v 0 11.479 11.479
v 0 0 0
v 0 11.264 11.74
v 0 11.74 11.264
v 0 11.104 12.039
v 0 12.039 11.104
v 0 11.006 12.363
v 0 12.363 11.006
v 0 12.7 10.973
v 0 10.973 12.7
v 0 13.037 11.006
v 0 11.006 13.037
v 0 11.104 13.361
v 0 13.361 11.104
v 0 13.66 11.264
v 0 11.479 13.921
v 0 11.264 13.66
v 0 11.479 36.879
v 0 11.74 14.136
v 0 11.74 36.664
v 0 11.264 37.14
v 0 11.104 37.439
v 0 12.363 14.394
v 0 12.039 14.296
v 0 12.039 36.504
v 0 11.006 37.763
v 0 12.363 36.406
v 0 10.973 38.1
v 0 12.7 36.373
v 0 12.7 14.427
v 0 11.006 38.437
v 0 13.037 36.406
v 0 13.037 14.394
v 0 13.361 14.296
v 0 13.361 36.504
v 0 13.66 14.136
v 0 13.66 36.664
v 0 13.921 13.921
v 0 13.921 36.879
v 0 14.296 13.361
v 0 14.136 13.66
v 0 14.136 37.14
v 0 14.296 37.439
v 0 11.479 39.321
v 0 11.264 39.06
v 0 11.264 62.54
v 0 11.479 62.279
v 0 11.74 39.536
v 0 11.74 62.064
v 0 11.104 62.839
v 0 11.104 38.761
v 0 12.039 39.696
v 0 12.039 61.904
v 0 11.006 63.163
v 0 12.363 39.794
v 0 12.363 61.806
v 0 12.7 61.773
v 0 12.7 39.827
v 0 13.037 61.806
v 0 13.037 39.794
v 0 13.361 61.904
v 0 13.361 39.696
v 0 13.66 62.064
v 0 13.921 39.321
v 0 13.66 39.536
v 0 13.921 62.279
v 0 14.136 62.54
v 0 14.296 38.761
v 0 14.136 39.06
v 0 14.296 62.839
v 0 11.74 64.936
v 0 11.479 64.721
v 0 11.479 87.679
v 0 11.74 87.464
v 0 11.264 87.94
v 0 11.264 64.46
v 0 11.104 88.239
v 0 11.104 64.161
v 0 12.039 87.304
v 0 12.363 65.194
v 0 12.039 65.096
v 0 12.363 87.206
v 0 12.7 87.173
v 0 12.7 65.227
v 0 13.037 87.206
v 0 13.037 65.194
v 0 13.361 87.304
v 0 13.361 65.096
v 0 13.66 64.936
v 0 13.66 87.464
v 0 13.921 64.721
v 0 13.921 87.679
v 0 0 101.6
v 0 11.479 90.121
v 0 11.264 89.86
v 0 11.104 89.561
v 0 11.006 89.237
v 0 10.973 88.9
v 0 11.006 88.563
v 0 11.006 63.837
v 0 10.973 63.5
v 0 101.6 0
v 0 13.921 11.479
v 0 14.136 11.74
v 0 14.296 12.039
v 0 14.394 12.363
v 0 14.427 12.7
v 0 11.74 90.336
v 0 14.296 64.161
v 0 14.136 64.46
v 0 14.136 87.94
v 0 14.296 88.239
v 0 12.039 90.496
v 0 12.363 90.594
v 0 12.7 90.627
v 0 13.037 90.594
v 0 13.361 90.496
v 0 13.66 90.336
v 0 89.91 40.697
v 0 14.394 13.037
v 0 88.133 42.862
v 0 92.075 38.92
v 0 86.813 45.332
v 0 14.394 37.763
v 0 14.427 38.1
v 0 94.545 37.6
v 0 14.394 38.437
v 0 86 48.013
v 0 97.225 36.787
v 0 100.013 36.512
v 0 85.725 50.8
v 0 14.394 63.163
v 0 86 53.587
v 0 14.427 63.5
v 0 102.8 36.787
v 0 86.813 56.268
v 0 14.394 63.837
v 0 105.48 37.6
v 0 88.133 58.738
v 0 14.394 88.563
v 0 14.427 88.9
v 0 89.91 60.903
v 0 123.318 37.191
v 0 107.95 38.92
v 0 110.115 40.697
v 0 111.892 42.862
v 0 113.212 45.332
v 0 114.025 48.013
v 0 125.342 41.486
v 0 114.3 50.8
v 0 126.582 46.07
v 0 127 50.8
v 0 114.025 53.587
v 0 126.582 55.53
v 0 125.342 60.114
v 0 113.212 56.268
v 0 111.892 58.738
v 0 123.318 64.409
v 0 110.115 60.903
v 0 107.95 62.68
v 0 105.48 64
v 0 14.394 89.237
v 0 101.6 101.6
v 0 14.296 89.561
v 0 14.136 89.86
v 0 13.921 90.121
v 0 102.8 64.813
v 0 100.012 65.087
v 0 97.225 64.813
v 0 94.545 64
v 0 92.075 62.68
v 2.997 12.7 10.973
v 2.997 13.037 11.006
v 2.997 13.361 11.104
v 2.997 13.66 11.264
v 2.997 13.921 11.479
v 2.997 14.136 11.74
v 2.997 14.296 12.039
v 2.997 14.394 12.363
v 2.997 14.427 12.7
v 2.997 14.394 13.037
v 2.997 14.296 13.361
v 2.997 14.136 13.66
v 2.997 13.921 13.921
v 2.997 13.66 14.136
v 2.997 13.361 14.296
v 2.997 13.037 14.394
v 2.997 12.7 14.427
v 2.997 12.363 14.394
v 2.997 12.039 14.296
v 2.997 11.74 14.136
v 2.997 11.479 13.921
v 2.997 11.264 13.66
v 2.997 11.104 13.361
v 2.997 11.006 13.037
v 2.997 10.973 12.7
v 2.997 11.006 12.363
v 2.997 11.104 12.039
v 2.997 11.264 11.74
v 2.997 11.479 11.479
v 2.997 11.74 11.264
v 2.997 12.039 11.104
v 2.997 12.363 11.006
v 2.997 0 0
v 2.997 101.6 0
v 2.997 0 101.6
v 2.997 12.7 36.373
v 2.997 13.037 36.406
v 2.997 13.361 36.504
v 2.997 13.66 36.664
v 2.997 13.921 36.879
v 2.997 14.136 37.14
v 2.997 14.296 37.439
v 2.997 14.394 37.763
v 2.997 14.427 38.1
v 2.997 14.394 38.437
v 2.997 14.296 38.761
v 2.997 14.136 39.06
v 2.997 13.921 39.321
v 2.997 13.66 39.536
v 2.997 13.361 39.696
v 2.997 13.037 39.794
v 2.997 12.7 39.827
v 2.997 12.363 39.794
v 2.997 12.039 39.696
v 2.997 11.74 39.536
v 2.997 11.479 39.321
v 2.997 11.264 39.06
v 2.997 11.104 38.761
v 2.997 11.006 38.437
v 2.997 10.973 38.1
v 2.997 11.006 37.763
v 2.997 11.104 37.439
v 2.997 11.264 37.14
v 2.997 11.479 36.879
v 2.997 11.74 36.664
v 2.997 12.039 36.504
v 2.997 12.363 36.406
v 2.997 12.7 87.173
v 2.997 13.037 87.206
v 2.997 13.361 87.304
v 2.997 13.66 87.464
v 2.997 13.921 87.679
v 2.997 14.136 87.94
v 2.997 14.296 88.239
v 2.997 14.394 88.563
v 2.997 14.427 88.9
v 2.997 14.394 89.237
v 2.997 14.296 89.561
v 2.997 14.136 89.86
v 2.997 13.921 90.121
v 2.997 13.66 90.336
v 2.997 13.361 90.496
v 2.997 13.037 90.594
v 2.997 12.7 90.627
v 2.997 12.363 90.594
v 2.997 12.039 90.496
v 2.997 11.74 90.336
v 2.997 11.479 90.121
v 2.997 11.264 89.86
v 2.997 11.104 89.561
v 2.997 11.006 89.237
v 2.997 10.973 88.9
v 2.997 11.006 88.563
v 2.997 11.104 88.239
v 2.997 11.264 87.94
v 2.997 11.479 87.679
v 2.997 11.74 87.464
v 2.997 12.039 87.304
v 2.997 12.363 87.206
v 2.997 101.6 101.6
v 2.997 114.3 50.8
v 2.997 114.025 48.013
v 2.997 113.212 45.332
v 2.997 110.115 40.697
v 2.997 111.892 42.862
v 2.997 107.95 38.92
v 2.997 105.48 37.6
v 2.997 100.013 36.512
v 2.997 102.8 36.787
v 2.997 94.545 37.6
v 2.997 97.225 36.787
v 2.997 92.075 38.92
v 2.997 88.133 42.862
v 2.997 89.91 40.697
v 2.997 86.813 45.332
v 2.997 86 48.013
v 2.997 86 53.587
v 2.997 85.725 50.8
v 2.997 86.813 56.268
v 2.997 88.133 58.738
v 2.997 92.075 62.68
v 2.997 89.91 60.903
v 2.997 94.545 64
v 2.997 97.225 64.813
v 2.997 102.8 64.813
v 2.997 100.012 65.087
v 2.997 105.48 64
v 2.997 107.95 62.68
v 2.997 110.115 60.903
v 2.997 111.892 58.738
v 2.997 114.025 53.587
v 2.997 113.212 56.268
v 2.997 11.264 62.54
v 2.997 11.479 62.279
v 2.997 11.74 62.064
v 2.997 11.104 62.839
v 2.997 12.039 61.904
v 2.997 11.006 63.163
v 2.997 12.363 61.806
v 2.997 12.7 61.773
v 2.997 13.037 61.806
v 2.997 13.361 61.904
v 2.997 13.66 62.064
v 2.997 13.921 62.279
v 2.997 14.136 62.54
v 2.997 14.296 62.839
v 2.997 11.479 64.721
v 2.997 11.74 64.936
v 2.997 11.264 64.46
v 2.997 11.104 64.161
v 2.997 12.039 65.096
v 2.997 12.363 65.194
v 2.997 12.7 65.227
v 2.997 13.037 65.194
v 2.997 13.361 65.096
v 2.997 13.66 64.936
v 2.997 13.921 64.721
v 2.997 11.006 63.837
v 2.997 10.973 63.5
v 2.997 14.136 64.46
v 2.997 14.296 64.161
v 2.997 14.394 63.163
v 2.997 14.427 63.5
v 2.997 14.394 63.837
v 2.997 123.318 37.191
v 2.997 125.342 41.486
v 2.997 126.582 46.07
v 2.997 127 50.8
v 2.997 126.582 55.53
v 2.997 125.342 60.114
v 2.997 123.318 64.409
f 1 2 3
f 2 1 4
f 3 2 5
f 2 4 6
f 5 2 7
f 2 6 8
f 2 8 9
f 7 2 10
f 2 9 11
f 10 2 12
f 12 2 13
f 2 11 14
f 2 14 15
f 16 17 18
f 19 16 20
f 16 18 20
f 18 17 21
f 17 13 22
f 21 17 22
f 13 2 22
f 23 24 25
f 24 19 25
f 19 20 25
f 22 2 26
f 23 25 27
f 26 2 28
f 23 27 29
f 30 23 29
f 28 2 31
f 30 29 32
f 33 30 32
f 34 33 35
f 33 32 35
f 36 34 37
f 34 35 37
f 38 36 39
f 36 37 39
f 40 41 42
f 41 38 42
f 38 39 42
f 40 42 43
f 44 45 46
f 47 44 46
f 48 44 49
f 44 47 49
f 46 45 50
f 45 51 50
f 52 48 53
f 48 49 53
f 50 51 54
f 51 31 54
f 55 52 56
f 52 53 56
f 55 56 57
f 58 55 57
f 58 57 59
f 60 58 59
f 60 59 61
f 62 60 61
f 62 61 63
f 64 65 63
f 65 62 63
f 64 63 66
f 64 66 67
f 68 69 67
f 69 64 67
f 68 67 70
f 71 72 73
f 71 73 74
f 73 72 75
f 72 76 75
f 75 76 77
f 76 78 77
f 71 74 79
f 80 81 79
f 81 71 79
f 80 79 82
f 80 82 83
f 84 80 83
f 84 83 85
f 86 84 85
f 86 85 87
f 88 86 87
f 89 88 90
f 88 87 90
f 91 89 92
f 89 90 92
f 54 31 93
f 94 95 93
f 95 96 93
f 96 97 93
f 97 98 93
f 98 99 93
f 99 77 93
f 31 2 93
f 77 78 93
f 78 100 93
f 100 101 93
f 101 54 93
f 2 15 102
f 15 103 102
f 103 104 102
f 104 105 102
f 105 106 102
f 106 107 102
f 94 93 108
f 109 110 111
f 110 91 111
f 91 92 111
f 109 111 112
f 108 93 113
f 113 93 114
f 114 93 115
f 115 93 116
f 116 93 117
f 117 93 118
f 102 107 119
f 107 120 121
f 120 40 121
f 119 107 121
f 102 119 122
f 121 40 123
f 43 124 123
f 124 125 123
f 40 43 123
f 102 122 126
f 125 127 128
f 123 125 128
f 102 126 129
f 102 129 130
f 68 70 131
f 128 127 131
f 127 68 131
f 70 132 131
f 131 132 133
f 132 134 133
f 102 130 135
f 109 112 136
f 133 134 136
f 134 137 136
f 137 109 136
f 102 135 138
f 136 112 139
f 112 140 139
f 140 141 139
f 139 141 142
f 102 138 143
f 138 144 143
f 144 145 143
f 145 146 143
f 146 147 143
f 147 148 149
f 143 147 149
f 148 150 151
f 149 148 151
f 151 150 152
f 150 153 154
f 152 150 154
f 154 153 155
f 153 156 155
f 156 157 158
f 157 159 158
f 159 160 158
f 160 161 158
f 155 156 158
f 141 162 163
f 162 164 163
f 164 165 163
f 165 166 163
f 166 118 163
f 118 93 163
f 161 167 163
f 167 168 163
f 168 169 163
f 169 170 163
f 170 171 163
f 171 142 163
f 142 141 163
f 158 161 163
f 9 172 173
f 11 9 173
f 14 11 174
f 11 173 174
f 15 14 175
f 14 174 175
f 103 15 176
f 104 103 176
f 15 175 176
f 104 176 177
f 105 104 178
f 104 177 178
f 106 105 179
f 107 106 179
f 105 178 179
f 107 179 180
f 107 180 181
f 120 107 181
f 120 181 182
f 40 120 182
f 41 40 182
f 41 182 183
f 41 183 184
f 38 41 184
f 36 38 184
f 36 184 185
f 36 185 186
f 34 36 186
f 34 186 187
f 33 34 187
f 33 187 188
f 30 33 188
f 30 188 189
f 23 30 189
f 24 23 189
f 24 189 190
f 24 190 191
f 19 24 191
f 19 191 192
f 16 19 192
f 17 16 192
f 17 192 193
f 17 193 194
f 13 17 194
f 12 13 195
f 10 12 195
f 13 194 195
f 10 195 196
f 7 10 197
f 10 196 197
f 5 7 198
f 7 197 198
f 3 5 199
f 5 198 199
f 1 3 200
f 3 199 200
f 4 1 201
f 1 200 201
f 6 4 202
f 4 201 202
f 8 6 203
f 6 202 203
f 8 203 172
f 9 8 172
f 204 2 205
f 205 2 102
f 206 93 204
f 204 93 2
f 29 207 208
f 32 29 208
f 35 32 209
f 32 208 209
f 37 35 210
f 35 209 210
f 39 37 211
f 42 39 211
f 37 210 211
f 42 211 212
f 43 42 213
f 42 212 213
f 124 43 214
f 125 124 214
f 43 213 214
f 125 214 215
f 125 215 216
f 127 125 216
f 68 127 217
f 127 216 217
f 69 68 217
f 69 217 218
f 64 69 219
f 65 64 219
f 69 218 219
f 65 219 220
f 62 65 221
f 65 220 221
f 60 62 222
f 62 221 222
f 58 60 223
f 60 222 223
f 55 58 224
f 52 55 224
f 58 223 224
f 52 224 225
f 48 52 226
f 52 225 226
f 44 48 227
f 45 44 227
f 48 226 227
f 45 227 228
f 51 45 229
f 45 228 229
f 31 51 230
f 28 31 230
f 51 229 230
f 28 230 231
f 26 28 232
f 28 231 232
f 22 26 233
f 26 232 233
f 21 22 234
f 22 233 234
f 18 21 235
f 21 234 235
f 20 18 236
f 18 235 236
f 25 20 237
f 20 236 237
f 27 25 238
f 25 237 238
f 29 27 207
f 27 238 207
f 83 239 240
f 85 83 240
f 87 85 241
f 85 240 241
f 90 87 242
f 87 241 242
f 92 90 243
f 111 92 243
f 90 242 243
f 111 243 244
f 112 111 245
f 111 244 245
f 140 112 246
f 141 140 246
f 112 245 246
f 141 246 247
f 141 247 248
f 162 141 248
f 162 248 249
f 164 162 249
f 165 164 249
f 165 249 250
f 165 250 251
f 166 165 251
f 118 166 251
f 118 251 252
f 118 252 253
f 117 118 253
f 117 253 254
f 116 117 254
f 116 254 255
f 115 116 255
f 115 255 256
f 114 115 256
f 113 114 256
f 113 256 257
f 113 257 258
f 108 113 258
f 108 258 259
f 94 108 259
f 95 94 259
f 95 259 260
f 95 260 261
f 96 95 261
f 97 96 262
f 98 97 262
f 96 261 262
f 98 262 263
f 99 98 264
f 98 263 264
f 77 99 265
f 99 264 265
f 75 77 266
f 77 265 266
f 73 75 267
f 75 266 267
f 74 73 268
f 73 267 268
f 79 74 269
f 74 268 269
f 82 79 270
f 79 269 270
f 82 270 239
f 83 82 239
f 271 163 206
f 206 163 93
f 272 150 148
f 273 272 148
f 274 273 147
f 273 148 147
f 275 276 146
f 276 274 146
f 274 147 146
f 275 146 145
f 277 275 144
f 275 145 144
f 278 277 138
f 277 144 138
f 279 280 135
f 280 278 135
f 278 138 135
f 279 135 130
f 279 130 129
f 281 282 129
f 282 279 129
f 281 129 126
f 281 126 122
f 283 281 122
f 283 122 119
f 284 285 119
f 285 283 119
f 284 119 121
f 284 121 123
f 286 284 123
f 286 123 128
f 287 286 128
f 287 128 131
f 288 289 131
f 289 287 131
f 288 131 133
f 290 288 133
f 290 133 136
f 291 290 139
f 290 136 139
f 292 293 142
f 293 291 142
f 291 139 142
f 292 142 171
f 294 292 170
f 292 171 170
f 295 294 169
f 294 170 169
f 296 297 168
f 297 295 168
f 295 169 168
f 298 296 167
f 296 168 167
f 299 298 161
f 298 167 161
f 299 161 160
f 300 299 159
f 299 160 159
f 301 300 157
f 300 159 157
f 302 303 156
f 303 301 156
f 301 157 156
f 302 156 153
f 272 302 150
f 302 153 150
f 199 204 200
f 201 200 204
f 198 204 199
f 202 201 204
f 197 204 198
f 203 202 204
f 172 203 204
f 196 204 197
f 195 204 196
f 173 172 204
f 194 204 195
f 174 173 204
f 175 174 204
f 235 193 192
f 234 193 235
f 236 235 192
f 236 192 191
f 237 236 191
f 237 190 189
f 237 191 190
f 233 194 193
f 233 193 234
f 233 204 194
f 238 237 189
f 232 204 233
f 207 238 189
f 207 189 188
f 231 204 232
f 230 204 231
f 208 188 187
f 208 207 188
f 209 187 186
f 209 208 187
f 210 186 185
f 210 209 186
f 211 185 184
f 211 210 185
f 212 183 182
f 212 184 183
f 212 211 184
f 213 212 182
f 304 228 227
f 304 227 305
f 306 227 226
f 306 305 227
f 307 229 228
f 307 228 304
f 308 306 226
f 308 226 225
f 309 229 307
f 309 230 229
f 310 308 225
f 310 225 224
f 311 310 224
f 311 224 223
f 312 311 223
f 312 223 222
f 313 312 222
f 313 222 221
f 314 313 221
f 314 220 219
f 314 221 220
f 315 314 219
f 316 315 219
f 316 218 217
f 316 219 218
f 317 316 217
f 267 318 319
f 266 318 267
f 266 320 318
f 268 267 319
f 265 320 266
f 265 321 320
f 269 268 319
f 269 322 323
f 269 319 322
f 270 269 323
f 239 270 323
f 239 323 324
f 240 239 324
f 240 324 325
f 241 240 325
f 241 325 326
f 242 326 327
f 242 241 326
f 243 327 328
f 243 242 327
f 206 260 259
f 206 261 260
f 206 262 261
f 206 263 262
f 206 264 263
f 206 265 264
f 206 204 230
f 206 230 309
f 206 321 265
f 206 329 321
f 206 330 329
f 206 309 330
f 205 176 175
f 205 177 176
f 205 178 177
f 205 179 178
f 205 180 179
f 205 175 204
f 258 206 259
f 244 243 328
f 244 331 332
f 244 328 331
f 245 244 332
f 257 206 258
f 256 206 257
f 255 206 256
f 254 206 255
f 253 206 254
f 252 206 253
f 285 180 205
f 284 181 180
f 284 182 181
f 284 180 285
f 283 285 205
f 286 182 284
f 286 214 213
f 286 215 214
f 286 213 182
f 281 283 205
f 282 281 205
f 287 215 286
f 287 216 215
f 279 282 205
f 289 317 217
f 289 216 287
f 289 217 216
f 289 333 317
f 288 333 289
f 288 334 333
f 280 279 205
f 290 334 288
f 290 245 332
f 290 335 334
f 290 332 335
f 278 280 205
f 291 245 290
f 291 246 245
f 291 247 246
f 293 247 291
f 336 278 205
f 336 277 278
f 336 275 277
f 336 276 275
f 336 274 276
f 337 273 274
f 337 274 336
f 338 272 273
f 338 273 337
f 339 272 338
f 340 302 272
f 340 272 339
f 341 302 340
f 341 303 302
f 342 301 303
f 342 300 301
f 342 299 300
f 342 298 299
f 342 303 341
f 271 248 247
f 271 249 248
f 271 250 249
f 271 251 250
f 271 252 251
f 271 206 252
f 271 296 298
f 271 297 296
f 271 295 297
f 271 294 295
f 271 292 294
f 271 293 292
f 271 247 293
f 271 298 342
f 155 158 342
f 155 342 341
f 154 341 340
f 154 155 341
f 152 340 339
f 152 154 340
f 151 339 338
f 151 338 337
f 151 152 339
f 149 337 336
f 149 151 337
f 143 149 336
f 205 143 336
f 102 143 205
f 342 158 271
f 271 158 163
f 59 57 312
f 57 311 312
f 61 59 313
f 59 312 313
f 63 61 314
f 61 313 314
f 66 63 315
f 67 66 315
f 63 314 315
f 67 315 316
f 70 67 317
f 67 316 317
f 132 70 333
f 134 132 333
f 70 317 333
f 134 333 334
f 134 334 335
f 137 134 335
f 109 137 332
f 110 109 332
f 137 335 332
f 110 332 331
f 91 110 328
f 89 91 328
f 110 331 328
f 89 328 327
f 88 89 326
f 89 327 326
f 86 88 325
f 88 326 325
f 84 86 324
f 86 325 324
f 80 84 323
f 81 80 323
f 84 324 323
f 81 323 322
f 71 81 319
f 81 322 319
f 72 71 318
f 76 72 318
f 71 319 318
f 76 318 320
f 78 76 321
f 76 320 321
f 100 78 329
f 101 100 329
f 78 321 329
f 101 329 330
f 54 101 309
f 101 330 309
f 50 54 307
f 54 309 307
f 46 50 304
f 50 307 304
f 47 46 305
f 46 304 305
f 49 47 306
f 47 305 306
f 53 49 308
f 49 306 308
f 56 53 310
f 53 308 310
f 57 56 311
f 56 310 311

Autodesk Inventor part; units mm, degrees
ref_plane "YZ Plane" through (0, 0, 0) normal (1, 0, 0) x (0, 1, 0)
ref_plane "XZ Plane" through (0, 0, 0) normal (0, 1, 0) x (-1, 0, 0)
ref_plane "XY Plane" through (0, 0, 0) normal (0, 0, 1) x (1, 0, 0)
sketch "Sketch1" plane through (0, 0, 0) normal (1, 0, 0) x (0, 1, 0)
  line L0 (127, 101.6) -> (0, 101.6)
  line L1 (0, 101.6) -> (0, 0)
  line L2 (0, 0) -> (127, 0)
  line L3 (127, 0) -> (127, 101.6)
  circle A0 centre (100.0125, 50.8) radius 14.2875
  circle A1 centre (100.0125, 50.8) radius 26.9875
  line L4 (123.3175, 64.4088) -> (101.6, 101.6)
  line L5 (123.3175, 37.1912) -> (101.6, 0)
  dimension "d0" = 101.6
  dimension "d1" = 127
  dimension "d2" = 12.7
  dimension "d3" = 50.8
  dimension "d5" = 28.575
  dimension "d6" = 101.6
  dimension "d7" = 101.6
extrude "Extrusion1" add sketch "Sketch1" along normal blind 2.9972 contours L4 A1 L5 L2 L1 L0 | A1
sketch "Sketch2" plane through (2.9972, 0, 0) normal (1, 0, 0) x (0, 0, -1)
  circle A0 centre (-88.9, 12.7) radius 1.7272
  line L0 (-101.6, 101.6) -> (-101.6, 0) projected
  line L1 (-101.6, 0) -> (0, 0) projected
  dimension "d10" = 12.7
  dimension "d11" = 12.7
  dimension "d12" = 3.4544
extrude "Extrusion2" cut sketch "Sketch2" against normal blind 2.9972
pattern_linear "Rectangular Pattern1" count 4 spacing 25.4 along (0, 0, -1) of "Extrusion2"
properties part number "Jeep Plate 2.1" material "Polycarbonate, Clear"
